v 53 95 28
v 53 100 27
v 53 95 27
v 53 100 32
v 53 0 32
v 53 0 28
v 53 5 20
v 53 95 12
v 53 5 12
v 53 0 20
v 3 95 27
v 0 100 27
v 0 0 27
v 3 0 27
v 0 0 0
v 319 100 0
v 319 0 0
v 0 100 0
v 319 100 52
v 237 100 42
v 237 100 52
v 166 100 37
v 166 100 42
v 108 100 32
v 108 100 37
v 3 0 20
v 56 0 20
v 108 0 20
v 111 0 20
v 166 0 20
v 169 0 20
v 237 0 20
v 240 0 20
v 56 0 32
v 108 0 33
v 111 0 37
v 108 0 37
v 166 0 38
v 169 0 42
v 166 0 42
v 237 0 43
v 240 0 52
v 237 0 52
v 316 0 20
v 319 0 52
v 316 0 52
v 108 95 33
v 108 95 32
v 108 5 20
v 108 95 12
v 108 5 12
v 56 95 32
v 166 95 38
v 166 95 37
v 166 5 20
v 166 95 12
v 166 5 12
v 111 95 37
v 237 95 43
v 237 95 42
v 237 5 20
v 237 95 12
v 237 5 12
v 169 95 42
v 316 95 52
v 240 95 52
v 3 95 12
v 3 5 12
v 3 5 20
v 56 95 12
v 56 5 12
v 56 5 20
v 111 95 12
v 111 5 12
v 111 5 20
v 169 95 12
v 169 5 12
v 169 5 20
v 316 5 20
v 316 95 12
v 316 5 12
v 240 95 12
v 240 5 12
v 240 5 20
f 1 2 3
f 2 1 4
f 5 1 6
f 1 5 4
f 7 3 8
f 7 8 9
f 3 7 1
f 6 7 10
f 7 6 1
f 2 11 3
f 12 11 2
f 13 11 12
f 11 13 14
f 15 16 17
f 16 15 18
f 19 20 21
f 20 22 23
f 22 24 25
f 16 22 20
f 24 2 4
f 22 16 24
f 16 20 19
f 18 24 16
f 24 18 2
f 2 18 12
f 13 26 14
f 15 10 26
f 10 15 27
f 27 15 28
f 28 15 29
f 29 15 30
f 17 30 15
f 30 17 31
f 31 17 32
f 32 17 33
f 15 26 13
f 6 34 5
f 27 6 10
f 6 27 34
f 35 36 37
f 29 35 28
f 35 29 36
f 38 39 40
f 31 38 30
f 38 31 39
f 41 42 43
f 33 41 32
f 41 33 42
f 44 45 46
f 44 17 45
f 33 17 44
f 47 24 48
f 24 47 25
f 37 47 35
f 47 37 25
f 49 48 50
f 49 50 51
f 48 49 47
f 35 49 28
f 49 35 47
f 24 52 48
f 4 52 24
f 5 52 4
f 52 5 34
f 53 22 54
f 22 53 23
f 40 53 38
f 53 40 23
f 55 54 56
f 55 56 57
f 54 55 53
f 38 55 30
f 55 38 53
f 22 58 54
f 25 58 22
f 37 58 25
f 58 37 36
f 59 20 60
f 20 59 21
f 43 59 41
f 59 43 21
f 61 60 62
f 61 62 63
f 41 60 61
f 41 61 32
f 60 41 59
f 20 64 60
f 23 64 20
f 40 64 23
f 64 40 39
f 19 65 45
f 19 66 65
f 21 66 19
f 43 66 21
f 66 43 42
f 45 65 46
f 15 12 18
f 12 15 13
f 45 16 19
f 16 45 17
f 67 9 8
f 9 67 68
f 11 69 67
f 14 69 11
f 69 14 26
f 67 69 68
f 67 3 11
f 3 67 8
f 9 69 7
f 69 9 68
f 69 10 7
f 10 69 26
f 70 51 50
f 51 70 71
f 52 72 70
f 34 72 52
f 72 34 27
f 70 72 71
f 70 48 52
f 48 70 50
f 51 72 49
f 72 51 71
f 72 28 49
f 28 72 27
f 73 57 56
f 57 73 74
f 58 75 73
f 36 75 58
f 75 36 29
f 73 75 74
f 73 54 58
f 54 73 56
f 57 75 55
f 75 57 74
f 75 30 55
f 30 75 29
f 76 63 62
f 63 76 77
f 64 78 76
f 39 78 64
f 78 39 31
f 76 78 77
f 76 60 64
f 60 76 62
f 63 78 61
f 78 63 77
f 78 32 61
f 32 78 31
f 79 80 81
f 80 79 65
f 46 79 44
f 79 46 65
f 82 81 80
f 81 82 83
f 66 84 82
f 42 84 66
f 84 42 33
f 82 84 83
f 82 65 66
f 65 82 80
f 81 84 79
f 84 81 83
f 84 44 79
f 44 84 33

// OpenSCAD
// PrimeBind TCG Rarity Station — V2
// Companion to TCG Content Backdrop. Sits flat on table in front of the backdrop.
//
// Zone order LEFT → RIGHT: HIT (rarest, smallest bucket) → C (most common, biggest bucket)
// All zones share the same base height — uniform yellow floor, buckets rise above it.
// Bucket SIZE (width × wall height) is proportional to how many cards you pull per pack.
//
//   HIT  50mm wide  15mm deep  — rarely fills, small bucket
//   R    52mm wide  20mm deep
//   RH   55mm wide  25mm deep  — 1 guaranteed per pack
//   U    68mm wide  30mm deep  — 3 per pack
//   C    76mm wide  40mm deep  — 6 per pack, biggest bucket
//
// PRINT: Single color (black). ~319mm × 100mm. Fits K2 Plus in one job, no supports.

// ─── CARD ─────────────────────────────────────────────────────────────────────
card_w = 63;

// ─── ZONE CONFIG — left to right: rarest → most common ───────────────────────
n_zones     = 5;
zone_widths = [50,    52,  55,   68,  76];   // HIT → C: narrower to wider
zone_wh     = [15,    20,  25,   30,  40];   // HIT → C: shallower to deeper bucket

// ─── BASE (uniform across all zones — this is the solid yellow floor) ─────────
base_floor_h = 12;    // ALL zones have this exact base height — buckets sit on top
base_d       = 100;   // depth front-to-back

// ─── BUCKET GEOMETRY ──────────────────────────────────────────────────────────
nub_d        = 5;     // front nub depth — catches card bottom edge
nub_h        = 8;     // front nub height above zone floor
back_wall_t  = 5;     // solid back wall at rear of each bucket

// ─── STRUCTURE ────────────────────────────────────────────────────────────────
outer_wall_t = 3;
div_t        = 3;     // divider thickness between zones
sym_dep      = 0.8;   // symbol emboss depth

// ─── DERIVED ──────────────────────────────────────────────────────────────────
total_w = outer_wall_t
        + zone_widths[0] + div_t
        + zone_widths[1] + div_t
        + zone_widths[2] + div_t
        + zone_widths[3] + div_t
        + zone_widths[4]
        + outer_wall_t;
// = 3 + 50+3 + 52+3 + 55+3 + 68+3 + 76 + 3 = 319mm ✓

function zone_x(i) = outer_wall_t
    + (i > 0 ? zone_widths[0] + div_t : 0)
    + (i > 1 ? zone_widths[1] + div_t : 0)
    + (i > 2 ? zone_widths[2] + div_t : 0)
    + (i > 3 ? zone_widths[3] + div_t : 0);

function zone_cx(i)  = zone_x(i) + zone_widths[i] / 2;
function zone_top(i) = base_floor_h + zone_wh[i];

$fn = 64;

// ─── STAR POLYGON ─────────────────────────────────────────────────────────────
module star_2d(r_out, r_in) {
    polygon([for (i = [0:9])
        let(a = i * 36 - 90, r = (i % 2 == 0) ? r_out : r_in)
        [r * cos(a), r * sin(a)]]);
}

// ─── RARITY SYMBOLS on front nub face ────────────────────────────────────────
// Centered vertically in the nub area (base_floor_h to base_floor_h+nub_h).
// Always visible from the front even with a card in the slot.
sym_cz = base_floor_h + nub_h / 2;   // = 16mm

module sym_hit(cx) {
    // ★★★ triple star — small, spread across narrow slot
    for (dx = [-9, 0, 9]) {
        translate([cx + dx, -0.1, sym_cz]) rotate([90, 0, 0])
        linear_extrude(sym_dep + 0.1) star_2d(3.8, 1.7);
    }
}

module sym_rare(cx) {
    // ★ filled star
    translate([cx, -0.1, sym_cz]) rotate([90, 0, 0])
    linear_extrude(sym_dep + 0.1) star_2d(5, 2.2);
}

module sym_rh(cx) {
    // ☆ open star — foil but not a hit
    translate([cx, -0.1, sym_cz]) rotate([90, 0, 0])
    linear_extrude(sym_dep + 0.1)
    difference() {
        star_2d(5, 2.2);
        scale([0.55, 0.55]) star_2d(5, 2.2);
    }
}

module sym_uncommon(cx) {
    // ◇ open diamond
    translate([cx, -0.1, sym_cz]) rotate([90, 0, 0])
    linear_extrude(sym_dep + 0.1)
    rotate([0, 0, 45])
    difference() { square(9, center=true); square(5.5, center=true); }
}

module sym_common(cx) {
    // ◯ open ring
    translate([cx, -0.1, sym_cz]) rotate([90, 0, 0])
    linear_extrude(sym_dep + 0.1)
    difference() { circle(r=4.5); circle(r=2.8); }
}

// ─── ZONE LABELS — small text on the base portion of front face ───────────────
module zone_labels() {
    labels = ["HIT", "R", "RH", "U", "C"];
    for (i = [0:4]) {
        translate([zone_cx(i), -0.1, base_floor_h / 2]) rotate([90, 0, 0])
        linear_extrude(sym_dep + 0.1)
        text(labels[i], size=4, font="Liberation Sans:style=Bold",
             halign="center", valign="center");
    }
}

// ─── BRANDING ─────────────────────────────────────────────────────────────────
module branding() {
    translate([total_w / 2, -0.1, 3]) rotate([90, 0, 0])
    linear_extrude(sym_dep + 0.1)
    text("PRIMEBIND", size=5,
         font="Bunken Tech Sans Pro ExBd:style=ExtraBold Italic",
         halign="center", valign="center");
}

// ─── ZONE SOLID ───────────────────────────────────────────────────────────────
module zone_block(i) {
    translate([zone_x(i), 0, 0])
        cube([zone_widths[i], base_d, zone_top(i)]);
}

// ─── DIVIDER — height is max of adjacent zones ────────────────────────────────
module div_block(i) {
    h = max(zone_top(i), zone_top(i + 1));
    translate([zone_x(i) + zone_widths[i], 0, 0])
        cube([div_t, base_d, h]);
}

// ─── OUTER WALLS ──────────────────────────────────────────────────────────────
module outer_walls() {
    // Left — height of HIT zone (shortest)
    cube([outer_wall_t, base_d, zone_top(0)]);
    // Right — height of C zone (tallest)
    translate([total_w - outer_wall_t, 0, 0])
        cube([outer_wall_t, base_d, zone_top(4)]);
}

// ─── BUCKET CUTS ──────────────────────────────────────────────────────────────

// Main interior cut — the open bucket space
module slot_interior(i) {
    translate([zone_x(i), nub_d, base_floor_h])
        cube([zone_widths[i], base_d - nub_d - back_wall_t, zone_wh[i] + 1]);
}

// Open the front face above the nub so card face is visible from front
module slot_front_open(i) {
    translate([zone_x(i), -0.1, base_floor_h + nub_h])
        cube([zone_widths[i], nub_d + 0.2, zone_wh[i] - nub_h + 1]);
}

// ─── ASSEMBLY ─────────────────────────────────────────────────────────────────
difference() {
    union() {
        for (i = [0:4]) zone_block(i);
        for (i = [0:3]) div_block(i);
        outer_walls();
    }
    // Bucket openings
    for (i = [0:4]) {
        slot_interior(i);
        slot_front_open(i);
    }
    // Symbols and labels
    sym_hit(zone_cx(0));
    sym_rare(zone_cx(1));
    sym_rh(zone_cx(2));
    sym_uncommon(zone_cx(3));
    sym_common(zone_cx(4));
    zone_labels();
    branding();
}
